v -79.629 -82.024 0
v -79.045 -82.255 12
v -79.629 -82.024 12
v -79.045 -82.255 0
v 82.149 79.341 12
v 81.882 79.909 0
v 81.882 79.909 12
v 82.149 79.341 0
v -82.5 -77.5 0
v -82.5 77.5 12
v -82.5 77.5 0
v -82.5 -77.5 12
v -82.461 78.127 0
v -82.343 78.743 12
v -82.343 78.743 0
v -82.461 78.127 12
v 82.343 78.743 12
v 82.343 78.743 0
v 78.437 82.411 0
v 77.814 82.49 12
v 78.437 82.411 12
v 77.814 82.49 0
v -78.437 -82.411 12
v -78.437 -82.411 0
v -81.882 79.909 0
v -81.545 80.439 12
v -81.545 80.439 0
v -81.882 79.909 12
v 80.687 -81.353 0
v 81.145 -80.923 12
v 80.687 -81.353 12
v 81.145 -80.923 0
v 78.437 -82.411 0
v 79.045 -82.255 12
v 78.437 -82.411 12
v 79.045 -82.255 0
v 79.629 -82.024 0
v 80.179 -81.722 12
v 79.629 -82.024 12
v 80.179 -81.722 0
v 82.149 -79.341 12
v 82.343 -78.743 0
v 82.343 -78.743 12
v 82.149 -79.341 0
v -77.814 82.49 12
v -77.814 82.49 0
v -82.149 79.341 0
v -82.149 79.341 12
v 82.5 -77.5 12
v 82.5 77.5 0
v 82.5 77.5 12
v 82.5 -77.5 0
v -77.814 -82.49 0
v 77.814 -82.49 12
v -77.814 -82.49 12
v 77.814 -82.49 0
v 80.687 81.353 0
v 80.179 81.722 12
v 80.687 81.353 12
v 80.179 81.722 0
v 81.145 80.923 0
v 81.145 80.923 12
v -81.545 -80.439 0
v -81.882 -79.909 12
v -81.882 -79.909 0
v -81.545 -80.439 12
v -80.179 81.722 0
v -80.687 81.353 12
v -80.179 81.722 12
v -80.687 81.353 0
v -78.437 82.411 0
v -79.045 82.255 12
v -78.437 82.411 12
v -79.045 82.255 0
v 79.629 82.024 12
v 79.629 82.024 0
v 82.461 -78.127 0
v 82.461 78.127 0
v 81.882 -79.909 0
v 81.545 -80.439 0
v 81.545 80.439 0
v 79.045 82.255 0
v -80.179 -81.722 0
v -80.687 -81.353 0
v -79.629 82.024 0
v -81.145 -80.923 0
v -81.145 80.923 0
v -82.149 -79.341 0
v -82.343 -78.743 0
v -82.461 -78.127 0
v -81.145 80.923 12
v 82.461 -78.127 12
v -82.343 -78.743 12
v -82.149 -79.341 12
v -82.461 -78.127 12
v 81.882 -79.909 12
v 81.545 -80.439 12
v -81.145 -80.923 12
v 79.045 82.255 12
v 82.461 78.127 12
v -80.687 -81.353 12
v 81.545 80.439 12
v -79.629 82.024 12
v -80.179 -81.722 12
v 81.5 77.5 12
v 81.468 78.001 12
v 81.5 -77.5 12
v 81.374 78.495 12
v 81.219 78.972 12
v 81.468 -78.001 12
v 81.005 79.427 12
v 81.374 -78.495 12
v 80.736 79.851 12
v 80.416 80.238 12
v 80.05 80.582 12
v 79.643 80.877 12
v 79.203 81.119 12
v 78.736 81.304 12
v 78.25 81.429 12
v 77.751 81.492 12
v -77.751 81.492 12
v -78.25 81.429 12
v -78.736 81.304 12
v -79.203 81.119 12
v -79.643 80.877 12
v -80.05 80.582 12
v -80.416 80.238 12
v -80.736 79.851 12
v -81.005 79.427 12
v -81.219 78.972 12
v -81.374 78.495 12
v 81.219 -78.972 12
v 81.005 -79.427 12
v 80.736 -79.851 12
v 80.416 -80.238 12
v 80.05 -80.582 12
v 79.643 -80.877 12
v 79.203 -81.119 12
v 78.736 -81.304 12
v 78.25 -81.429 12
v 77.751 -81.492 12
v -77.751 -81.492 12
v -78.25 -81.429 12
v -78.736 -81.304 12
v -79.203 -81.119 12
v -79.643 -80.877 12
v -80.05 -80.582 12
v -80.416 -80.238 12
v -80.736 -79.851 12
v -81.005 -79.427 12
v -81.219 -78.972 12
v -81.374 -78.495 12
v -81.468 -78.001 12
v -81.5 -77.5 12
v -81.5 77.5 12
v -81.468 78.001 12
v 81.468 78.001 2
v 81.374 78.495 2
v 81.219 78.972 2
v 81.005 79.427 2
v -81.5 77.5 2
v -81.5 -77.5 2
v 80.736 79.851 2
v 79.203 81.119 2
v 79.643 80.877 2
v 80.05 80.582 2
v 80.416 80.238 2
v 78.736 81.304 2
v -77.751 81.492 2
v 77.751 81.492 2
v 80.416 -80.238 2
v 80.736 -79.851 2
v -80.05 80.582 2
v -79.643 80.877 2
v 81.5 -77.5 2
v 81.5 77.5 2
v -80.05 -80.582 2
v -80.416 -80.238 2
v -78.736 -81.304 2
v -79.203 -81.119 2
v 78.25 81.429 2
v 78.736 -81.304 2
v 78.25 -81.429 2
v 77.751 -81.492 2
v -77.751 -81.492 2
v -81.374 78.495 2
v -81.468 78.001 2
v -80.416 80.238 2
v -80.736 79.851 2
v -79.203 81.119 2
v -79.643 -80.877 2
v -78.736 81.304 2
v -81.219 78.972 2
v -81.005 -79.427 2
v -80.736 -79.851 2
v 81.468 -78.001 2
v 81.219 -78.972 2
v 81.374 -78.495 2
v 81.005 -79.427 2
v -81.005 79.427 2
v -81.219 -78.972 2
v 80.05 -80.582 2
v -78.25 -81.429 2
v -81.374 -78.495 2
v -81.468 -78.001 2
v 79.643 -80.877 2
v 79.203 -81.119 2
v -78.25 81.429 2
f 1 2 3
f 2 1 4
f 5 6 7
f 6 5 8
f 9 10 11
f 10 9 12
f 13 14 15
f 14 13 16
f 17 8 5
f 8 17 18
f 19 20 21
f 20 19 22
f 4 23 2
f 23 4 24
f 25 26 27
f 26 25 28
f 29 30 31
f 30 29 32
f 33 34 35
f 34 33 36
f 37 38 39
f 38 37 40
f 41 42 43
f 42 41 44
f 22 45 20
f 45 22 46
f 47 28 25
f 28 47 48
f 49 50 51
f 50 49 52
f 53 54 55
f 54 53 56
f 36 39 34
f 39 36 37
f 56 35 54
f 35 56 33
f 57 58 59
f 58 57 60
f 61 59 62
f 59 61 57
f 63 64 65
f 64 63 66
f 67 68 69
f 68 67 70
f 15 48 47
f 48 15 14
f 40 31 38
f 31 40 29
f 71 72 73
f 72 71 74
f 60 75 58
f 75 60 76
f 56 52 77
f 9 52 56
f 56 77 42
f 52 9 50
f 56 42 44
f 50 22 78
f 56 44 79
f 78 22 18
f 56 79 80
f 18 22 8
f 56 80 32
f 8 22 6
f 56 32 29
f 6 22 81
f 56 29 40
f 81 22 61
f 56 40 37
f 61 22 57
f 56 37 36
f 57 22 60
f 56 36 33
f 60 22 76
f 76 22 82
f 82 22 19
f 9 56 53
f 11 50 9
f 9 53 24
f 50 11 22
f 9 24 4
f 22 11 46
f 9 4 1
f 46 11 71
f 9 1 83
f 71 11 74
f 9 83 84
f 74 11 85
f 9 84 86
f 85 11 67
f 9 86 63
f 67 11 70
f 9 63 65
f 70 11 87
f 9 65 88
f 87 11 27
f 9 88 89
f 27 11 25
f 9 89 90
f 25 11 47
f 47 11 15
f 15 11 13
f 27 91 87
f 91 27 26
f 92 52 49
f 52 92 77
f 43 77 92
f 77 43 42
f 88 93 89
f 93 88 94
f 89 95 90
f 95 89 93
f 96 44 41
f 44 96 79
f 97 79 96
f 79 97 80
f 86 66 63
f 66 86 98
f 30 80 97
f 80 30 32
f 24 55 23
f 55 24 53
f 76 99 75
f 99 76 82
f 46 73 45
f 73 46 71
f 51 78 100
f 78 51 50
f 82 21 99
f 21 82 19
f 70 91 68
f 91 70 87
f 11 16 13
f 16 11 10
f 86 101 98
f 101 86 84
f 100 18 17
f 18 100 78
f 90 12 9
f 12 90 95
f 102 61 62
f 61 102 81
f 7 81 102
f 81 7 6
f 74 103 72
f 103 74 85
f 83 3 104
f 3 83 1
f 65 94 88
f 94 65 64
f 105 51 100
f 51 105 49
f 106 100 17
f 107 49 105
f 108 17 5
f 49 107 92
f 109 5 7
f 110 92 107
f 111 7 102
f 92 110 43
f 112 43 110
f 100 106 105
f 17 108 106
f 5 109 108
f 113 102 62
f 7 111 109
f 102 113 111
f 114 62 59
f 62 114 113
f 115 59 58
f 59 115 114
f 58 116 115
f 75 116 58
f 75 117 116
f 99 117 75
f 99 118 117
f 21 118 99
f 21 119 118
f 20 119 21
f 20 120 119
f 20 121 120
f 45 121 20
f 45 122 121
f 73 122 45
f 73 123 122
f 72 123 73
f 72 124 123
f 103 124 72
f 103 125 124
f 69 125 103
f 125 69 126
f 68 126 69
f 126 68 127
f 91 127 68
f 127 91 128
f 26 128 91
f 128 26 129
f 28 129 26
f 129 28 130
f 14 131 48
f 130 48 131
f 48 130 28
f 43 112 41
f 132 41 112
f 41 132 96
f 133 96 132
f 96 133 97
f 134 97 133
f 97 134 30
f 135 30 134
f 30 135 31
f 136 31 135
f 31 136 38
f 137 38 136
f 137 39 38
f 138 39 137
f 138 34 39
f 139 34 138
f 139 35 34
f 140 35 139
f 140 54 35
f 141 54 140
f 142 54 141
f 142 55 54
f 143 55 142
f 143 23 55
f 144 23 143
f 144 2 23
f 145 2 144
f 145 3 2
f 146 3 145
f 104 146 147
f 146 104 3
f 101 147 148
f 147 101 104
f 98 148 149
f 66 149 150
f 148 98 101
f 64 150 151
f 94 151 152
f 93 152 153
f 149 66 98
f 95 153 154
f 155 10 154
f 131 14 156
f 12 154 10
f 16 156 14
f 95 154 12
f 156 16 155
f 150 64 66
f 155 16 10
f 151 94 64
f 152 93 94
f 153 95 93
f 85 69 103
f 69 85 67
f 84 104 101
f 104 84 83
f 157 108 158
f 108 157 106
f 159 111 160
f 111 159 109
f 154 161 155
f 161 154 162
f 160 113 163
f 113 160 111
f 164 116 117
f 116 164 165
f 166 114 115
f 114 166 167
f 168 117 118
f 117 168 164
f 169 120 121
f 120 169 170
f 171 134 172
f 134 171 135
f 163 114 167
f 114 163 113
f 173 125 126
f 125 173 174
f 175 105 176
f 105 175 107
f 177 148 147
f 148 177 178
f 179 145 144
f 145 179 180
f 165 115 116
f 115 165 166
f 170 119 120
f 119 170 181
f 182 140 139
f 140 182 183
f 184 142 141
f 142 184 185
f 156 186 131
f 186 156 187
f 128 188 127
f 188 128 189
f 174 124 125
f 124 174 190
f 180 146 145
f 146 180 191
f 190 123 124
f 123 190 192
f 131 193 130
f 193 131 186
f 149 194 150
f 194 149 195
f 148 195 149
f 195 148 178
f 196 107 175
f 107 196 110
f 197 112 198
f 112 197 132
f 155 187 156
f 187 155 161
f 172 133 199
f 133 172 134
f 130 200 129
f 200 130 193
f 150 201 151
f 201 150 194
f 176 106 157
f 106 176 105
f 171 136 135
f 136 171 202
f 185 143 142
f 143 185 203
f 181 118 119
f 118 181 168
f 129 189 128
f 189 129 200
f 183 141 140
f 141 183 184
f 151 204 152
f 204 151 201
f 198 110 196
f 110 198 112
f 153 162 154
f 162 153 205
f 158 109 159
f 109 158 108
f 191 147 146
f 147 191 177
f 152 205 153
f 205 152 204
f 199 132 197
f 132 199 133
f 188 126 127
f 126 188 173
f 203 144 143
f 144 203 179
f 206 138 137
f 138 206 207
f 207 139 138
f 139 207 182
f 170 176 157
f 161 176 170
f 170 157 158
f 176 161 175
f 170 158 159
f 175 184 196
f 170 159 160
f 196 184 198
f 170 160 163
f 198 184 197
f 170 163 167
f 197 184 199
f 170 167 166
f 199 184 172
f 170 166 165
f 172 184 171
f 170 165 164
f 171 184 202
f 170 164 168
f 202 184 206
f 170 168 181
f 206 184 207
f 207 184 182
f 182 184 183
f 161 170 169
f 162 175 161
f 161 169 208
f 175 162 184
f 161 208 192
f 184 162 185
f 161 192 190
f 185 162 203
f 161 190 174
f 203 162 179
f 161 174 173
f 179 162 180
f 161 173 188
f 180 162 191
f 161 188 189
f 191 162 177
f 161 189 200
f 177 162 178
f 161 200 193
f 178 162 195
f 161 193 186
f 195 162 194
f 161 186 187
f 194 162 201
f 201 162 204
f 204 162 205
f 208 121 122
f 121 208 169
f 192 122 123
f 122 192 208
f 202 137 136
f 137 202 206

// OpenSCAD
$fn = 50;


difference() {
	union() {
		hull() {
			translate(v = [-77.5000000000, 77.5000000000, 0]) {
				cylinder(h = 12, r = 5);
			}
			translate(v = [77.5000000000, 77.5000000000, 0]) {
				cylinder(h = 12, r = 5);
			}
			translate(v = [-77.5000000000, -77.5000000000, 0]) {
				cylinder(h = 12, r = 5);
			}
			translate(v = [77.5000000000, -77.5000000000, 0]) {
				cylinder(h = 12, r = 5);
			}
		}
	}
	union() {
		translate(v = [0, 0, 2]) {
			hull() {
				translate(v = [-77.5000000000, 77.5000000000, 0]) {
					cylinder(h = 10, r = 4);
				}
				translate(v = [77.5000000000, 77.5000000000, 0]) {
					cylinder(h = 10, r = 4);
				}
				translate(v = [-77.5000000000, -77.5000000000, 0]) {
					cylinder(h = 10, r = 4);
				}
				translate(v = [77.5000000000, -77.5000000000, 0]) {
					cylinder(h = 10, r = 4);
				}
			}
		}
	}
}
